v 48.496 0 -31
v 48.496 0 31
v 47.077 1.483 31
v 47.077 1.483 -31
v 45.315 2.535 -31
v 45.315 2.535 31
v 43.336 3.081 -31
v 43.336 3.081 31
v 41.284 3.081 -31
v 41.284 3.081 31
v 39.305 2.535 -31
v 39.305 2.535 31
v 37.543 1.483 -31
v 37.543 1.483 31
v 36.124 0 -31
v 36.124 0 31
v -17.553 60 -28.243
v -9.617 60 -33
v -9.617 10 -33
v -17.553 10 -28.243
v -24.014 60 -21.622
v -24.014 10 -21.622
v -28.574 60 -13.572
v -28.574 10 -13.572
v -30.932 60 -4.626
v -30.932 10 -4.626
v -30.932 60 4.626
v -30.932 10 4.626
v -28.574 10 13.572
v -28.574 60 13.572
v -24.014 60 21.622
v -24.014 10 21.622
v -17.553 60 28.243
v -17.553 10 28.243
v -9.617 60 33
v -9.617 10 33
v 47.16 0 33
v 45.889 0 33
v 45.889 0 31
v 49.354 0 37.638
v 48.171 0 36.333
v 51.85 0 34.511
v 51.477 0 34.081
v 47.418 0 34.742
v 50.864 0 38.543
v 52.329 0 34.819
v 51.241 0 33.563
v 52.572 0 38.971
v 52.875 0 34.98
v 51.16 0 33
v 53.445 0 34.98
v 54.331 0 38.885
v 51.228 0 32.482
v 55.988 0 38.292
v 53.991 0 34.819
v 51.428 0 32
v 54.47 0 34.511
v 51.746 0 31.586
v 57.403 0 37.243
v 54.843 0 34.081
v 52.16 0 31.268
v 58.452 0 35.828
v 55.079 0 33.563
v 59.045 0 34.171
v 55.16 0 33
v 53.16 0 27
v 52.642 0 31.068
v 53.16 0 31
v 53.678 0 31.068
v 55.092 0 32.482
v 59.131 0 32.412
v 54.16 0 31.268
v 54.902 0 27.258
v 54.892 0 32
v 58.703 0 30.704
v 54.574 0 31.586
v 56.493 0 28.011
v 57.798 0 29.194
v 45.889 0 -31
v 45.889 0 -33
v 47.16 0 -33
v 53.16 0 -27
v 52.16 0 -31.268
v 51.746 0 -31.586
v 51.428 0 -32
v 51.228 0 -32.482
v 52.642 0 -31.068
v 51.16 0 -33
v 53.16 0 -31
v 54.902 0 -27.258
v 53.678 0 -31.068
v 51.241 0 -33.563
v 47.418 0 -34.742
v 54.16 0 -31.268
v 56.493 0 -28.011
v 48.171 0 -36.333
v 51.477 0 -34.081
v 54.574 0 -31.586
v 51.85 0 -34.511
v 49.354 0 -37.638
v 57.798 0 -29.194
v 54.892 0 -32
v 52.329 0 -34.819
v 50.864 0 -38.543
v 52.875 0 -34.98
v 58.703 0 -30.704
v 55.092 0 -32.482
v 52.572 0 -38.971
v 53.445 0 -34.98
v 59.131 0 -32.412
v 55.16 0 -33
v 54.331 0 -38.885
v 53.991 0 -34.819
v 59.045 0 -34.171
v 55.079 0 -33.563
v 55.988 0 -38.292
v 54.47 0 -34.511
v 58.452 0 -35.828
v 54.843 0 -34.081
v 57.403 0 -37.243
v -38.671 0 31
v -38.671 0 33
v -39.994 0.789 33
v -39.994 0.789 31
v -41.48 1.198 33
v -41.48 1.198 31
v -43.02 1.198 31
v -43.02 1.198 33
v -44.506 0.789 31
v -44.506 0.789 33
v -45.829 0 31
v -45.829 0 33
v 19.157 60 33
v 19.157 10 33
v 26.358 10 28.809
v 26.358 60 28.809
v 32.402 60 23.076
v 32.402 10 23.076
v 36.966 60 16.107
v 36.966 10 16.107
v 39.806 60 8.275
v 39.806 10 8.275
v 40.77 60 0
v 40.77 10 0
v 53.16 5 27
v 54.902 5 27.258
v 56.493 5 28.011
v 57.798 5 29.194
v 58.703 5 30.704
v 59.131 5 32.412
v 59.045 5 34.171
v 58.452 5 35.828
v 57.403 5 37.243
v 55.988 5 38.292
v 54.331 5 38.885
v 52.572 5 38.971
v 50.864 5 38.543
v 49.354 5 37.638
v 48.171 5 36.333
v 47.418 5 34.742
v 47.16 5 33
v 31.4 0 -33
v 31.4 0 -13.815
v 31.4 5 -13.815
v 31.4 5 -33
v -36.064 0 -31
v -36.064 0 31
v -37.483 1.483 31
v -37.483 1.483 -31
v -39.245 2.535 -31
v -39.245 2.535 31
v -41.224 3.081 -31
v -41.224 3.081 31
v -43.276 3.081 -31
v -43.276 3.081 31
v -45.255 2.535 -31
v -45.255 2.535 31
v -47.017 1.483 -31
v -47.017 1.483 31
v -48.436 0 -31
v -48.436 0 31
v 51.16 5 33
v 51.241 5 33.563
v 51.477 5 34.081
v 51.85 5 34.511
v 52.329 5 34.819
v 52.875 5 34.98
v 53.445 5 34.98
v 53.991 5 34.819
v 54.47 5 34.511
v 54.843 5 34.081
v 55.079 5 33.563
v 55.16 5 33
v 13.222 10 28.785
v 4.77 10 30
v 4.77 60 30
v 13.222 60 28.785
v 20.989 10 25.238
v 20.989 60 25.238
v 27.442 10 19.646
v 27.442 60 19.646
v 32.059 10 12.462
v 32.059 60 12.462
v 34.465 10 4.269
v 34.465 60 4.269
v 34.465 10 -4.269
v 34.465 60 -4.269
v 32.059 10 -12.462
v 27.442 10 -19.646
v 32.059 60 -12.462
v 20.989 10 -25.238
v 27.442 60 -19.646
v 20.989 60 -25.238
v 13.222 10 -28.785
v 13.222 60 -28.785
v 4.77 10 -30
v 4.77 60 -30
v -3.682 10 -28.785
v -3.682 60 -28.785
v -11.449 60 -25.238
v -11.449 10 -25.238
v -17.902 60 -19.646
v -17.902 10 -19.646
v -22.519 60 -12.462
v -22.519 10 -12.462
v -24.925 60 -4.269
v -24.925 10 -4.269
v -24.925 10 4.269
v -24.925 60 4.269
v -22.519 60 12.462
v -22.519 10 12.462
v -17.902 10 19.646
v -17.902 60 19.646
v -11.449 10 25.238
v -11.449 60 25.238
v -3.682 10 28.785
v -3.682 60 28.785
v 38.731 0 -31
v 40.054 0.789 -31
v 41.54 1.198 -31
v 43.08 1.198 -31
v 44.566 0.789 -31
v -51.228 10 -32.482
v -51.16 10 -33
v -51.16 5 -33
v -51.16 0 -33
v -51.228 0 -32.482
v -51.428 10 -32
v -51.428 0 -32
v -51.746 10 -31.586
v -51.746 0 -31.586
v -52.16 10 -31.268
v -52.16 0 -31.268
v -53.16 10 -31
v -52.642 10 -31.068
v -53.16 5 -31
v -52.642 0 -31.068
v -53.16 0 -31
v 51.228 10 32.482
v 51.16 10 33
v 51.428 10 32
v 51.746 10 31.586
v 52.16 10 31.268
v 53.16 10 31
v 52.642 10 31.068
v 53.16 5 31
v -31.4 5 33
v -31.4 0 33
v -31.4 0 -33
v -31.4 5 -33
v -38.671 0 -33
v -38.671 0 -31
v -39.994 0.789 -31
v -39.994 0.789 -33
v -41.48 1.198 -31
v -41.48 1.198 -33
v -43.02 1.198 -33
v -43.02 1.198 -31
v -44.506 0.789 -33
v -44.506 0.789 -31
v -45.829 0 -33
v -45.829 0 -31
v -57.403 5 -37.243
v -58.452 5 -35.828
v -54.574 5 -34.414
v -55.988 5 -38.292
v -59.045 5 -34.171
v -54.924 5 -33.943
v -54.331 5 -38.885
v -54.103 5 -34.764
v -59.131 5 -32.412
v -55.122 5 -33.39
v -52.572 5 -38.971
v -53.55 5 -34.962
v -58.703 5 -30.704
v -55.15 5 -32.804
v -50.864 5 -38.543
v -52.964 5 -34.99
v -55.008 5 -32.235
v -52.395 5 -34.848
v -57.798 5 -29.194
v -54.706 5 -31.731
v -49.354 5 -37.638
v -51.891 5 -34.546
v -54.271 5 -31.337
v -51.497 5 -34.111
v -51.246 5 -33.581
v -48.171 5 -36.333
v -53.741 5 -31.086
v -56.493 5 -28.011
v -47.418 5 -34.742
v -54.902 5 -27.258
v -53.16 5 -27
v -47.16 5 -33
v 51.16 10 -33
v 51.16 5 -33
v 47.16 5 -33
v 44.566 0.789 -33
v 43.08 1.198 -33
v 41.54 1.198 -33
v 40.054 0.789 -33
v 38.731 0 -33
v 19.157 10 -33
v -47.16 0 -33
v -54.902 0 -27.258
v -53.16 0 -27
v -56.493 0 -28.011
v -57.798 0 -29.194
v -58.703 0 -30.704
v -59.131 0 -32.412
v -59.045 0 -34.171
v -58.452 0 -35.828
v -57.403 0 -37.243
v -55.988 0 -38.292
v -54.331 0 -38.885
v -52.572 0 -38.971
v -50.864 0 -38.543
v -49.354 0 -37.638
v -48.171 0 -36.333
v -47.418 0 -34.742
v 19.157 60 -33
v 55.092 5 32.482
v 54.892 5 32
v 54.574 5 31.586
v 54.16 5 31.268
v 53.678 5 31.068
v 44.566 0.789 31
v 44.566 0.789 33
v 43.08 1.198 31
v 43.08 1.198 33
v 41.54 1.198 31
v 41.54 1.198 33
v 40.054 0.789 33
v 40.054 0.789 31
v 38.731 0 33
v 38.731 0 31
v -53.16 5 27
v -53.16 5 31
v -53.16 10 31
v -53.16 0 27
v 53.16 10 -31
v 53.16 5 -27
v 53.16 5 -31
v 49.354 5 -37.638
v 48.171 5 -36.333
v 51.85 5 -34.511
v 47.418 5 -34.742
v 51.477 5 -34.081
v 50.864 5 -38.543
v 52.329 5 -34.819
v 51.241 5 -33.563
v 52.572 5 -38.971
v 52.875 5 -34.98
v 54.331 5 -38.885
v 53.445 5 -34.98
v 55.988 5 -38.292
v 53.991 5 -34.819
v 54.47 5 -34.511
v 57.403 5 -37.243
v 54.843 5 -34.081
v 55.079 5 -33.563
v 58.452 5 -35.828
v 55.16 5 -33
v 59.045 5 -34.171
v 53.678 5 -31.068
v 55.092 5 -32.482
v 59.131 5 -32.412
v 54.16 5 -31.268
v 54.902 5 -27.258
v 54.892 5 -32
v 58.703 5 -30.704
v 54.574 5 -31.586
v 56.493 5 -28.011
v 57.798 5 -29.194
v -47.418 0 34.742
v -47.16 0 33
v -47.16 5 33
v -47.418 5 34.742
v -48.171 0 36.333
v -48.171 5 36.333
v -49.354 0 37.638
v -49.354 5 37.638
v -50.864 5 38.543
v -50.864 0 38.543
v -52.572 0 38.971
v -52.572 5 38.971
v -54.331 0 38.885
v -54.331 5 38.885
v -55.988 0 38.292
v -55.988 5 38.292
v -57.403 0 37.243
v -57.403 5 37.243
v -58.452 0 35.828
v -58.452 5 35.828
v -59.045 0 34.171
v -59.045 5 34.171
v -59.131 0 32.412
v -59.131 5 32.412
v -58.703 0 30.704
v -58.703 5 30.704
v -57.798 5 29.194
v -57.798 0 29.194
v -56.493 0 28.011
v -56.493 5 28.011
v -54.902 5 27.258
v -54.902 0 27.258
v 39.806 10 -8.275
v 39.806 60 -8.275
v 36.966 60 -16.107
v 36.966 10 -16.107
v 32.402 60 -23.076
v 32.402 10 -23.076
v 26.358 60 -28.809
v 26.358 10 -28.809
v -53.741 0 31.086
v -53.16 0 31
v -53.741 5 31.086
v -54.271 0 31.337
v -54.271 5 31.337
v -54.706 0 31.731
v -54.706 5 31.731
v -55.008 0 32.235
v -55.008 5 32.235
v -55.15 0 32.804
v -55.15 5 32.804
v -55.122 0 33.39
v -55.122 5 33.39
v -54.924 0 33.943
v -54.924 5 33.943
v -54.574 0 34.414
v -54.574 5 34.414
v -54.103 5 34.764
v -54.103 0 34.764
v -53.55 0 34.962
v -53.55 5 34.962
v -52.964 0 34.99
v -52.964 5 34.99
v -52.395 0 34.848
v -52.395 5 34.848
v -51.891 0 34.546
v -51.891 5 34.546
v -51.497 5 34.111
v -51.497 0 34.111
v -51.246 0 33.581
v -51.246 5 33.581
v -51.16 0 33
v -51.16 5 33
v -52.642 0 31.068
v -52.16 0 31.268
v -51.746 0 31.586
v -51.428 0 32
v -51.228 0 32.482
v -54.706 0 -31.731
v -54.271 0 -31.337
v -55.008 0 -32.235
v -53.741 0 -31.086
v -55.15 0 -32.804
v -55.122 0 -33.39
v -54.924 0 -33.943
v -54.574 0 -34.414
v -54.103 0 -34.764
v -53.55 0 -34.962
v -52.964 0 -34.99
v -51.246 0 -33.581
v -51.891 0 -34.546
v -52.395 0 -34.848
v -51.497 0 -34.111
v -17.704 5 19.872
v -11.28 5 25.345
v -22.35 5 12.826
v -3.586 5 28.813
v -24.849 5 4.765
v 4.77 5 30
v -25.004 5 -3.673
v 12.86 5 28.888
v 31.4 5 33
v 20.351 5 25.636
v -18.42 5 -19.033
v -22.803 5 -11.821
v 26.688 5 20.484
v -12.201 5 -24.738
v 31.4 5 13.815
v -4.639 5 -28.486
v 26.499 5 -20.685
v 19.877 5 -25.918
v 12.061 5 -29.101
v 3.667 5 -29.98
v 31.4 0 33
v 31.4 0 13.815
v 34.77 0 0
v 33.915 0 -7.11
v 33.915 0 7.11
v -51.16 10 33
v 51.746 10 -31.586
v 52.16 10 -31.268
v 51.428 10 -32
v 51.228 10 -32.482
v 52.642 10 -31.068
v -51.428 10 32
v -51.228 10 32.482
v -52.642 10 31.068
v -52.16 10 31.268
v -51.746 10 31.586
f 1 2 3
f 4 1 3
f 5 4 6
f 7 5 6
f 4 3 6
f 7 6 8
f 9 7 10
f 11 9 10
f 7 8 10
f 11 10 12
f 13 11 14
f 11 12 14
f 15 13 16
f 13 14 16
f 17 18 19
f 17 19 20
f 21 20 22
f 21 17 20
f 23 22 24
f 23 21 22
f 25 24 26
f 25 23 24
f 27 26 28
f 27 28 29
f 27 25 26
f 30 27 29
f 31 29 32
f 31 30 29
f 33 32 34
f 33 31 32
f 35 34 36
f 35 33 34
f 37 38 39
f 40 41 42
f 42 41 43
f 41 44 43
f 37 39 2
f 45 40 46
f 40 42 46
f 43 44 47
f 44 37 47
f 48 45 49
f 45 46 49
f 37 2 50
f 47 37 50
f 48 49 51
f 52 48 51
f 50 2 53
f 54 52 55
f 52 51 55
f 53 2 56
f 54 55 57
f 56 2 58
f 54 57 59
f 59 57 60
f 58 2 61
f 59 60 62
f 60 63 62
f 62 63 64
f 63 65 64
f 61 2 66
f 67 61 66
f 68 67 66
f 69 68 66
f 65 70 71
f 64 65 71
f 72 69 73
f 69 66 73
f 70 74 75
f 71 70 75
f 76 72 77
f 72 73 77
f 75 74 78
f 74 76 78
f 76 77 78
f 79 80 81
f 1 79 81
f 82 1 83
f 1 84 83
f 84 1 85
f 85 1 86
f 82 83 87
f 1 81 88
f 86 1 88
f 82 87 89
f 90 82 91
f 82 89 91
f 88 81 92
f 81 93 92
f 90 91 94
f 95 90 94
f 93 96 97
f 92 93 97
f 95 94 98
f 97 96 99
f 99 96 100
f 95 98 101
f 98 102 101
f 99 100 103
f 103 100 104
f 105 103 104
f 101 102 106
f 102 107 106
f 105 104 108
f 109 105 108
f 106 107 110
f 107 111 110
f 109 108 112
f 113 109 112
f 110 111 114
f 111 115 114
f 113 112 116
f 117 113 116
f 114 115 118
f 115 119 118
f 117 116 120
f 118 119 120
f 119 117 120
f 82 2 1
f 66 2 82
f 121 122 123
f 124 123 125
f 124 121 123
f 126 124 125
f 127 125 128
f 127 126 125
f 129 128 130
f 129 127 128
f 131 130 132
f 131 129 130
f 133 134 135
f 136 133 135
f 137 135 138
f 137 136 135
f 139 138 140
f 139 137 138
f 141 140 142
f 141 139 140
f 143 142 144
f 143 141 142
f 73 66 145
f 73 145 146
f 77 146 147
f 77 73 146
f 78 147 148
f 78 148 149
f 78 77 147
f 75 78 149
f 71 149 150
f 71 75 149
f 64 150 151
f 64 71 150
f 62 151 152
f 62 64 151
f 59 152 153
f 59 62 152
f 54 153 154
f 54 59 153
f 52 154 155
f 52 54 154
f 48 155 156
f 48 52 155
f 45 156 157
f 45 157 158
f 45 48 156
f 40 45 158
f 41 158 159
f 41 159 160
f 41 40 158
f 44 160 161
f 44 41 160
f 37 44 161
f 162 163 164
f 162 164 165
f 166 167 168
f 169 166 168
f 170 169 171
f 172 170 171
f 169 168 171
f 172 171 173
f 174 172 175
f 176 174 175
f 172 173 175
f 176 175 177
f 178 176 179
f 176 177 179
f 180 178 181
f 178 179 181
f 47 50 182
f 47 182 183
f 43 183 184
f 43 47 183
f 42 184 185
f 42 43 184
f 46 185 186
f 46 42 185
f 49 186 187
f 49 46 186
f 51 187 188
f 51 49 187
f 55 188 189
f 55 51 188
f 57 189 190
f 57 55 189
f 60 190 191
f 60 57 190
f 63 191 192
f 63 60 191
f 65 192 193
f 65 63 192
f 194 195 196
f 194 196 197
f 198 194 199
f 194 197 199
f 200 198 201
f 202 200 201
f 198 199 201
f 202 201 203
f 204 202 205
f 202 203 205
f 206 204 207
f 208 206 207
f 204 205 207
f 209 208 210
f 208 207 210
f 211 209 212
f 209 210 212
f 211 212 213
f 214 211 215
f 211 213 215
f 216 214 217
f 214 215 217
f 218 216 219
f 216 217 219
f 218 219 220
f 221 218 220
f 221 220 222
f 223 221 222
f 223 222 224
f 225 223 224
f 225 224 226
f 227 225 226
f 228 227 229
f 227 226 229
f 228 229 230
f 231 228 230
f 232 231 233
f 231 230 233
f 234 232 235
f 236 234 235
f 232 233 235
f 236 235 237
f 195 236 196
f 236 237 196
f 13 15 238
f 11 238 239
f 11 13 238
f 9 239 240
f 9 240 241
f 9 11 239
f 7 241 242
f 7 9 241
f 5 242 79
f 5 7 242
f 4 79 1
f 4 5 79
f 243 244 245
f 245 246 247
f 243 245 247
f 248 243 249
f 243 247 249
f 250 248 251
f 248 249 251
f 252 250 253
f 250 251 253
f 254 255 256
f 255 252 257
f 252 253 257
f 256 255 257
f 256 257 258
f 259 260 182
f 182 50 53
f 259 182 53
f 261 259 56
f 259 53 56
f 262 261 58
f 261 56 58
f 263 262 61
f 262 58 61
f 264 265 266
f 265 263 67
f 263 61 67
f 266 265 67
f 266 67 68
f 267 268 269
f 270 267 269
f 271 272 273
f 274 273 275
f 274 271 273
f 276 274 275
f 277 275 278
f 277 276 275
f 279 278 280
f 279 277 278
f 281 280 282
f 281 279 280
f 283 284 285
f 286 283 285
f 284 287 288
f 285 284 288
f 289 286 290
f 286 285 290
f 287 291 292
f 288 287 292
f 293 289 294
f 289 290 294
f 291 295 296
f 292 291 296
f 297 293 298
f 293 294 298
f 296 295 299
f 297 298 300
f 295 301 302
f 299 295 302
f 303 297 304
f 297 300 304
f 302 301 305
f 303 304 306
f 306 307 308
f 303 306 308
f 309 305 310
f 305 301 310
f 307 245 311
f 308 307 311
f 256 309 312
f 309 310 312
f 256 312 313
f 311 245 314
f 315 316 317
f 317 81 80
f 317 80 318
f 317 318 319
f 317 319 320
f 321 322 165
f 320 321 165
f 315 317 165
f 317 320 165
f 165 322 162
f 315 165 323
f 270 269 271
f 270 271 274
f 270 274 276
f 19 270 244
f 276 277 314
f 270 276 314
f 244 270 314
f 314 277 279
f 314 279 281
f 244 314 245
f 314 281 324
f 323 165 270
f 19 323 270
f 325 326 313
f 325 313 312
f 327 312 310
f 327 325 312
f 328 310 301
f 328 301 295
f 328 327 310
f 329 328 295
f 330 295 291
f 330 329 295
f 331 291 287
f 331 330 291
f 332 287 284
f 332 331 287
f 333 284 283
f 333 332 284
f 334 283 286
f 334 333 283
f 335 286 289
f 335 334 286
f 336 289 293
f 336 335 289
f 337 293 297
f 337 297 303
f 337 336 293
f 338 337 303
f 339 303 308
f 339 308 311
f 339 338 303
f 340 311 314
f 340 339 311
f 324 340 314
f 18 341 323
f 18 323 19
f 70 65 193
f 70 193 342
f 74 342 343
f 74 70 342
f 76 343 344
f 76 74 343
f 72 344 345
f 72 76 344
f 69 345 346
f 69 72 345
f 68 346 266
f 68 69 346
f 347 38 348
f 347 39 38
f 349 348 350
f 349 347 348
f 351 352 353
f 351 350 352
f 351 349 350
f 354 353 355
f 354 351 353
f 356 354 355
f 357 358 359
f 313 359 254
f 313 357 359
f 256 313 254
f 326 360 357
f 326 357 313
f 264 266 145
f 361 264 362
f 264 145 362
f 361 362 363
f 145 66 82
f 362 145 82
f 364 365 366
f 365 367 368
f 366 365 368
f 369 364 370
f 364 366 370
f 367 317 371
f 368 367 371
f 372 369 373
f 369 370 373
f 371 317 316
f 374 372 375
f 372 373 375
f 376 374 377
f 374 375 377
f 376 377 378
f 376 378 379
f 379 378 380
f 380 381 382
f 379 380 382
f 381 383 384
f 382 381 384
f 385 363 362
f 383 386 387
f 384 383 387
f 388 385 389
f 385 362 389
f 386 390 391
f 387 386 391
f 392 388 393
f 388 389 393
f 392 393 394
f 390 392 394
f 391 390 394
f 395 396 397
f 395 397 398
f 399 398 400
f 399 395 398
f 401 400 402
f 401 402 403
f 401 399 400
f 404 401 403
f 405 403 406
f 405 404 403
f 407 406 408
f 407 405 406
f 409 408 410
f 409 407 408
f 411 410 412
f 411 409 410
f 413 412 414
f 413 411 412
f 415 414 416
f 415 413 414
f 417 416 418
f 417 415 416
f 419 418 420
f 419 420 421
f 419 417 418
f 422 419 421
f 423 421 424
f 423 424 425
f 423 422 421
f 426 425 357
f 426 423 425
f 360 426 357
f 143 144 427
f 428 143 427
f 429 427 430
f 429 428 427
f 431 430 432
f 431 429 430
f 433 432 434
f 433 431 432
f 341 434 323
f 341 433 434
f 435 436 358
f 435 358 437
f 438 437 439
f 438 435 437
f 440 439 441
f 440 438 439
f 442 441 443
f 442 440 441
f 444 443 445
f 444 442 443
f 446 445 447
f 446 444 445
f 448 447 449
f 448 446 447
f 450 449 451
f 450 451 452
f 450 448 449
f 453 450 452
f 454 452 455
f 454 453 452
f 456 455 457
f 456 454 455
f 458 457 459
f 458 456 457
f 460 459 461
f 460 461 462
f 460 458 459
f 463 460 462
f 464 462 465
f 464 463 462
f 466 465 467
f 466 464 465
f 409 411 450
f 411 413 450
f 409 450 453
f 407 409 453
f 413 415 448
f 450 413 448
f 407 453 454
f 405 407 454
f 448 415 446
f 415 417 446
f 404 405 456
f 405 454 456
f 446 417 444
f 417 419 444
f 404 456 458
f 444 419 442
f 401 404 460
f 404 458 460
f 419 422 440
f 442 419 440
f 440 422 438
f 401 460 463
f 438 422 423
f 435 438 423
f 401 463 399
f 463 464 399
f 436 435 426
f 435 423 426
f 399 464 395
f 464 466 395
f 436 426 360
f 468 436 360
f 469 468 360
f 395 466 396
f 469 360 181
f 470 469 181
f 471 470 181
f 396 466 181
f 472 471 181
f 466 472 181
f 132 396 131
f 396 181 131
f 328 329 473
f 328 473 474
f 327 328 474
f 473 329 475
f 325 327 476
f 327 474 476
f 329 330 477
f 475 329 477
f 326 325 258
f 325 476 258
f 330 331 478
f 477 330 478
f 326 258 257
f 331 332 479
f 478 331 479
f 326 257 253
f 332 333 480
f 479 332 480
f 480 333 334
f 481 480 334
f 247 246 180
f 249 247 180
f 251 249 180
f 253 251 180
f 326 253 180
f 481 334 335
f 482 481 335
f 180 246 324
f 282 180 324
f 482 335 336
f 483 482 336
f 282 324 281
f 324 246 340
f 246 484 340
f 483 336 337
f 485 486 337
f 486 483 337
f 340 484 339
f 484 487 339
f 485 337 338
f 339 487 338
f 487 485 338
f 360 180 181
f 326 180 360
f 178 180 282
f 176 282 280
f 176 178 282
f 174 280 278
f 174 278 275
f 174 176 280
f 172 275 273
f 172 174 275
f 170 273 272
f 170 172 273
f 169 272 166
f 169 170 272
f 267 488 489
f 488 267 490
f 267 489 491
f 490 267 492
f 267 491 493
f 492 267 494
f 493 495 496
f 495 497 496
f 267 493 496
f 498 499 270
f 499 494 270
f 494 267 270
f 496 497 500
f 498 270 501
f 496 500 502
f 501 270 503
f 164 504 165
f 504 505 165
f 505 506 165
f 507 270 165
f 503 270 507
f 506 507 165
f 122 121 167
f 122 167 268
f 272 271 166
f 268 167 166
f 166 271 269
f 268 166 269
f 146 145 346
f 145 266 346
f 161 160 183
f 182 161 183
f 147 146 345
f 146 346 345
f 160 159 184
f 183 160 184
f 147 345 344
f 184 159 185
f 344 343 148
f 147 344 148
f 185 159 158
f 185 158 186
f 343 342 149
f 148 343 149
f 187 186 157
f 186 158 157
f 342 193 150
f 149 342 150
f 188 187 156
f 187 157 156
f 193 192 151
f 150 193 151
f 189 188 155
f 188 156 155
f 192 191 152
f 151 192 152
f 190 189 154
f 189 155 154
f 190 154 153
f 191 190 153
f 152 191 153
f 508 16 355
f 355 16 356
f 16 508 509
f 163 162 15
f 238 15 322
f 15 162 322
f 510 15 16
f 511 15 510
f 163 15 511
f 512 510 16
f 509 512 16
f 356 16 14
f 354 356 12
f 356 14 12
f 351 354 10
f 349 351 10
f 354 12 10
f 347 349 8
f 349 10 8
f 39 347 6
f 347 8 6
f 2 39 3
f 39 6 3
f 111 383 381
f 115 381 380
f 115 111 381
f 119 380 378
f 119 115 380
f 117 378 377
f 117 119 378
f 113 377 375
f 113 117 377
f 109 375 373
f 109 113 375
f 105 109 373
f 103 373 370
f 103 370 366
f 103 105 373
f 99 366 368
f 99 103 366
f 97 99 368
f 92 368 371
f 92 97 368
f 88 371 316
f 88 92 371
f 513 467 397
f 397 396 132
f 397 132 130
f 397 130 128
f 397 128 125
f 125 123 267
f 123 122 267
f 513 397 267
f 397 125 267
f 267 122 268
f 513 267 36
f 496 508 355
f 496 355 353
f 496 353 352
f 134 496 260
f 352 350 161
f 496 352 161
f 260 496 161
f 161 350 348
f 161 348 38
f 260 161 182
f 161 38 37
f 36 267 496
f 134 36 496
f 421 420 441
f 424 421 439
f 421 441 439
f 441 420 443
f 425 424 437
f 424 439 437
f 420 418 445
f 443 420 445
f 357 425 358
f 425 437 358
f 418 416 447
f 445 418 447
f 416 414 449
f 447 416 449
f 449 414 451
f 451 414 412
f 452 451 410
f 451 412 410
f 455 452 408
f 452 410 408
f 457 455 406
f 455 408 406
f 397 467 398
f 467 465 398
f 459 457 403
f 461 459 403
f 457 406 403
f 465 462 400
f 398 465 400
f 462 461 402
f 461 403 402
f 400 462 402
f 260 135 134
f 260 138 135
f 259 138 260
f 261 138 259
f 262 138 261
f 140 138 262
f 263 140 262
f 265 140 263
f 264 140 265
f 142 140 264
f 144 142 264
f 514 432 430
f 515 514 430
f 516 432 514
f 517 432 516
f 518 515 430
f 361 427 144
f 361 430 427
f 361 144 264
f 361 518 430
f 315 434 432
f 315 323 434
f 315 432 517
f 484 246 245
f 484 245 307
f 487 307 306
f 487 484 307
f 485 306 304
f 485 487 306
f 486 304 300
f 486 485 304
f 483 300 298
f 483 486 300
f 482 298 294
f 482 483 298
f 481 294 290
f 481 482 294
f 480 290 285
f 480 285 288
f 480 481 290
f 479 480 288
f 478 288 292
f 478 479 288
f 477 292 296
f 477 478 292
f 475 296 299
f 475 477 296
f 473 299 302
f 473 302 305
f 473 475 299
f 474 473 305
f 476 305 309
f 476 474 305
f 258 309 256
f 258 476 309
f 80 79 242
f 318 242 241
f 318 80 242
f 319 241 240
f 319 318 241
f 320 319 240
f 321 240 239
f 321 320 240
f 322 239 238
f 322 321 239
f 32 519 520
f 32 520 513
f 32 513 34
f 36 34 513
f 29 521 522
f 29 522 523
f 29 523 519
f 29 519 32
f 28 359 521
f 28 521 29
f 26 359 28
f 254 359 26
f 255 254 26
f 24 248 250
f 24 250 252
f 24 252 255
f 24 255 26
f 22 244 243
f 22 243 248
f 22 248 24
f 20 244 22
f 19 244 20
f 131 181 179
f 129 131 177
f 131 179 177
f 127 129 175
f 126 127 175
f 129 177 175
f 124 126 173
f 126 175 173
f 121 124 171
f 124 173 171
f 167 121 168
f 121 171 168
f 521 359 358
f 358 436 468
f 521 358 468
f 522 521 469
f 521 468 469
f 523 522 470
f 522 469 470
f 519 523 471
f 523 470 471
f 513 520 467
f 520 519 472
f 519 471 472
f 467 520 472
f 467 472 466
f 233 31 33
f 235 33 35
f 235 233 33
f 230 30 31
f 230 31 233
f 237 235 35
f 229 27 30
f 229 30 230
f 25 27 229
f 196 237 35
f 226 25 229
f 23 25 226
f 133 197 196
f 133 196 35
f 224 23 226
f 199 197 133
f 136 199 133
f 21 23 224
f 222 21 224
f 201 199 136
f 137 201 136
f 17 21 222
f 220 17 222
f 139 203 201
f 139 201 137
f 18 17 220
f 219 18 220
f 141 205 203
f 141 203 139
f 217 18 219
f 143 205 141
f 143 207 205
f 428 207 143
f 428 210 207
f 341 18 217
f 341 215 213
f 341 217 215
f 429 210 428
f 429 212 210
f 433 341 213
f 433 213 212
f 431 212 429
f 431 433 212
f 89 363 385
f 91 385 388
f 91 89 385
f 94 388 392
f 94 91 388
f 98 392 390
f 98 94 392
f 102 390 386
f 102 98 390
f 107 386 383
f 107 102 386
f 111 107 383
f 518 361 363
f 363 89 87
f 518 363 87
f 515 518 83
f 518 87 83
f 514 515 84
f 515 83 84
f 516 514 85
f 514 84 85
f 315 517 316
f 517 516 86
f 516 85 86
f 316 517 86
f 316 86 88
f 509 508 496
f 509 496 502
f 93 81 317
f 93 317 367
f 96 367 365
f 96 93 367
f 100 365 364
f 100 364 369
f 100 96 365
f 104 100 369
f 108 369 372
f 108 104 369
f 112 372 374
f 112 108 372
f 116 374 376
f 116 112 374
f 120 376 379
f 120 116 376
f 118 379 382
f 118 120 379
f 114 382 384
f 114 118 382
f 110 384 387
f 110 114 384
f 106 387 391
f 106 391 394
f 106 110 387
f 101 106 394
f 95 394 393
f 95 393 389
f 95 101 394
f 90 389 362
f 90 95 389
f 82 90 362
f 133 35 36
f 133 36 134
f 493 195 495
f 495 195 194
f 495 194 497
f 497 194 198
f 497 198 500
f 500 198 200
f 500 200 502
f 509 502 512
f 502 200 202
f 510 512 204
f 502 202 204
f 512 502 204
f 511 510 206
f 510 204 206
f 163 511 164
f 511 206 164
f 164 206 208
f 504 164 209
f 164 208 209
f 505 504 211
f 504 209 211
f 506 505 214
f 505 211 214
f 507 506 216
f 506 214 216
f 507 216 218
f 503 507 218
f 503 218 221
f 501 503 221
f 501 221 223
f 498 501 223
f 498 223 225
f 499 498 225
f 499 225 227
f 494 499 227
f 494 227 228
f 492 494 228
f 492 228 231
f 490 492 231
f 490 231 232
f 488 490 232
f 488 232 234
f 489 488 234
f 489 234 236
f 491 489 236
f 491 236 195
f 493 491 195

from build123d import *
from build123d.topology import SkipClean

# Parameters (mm, degrees)
SKETCH1_W               = 21.76
SKETCH1_H               = 66
SKETCH1_W_2             = 62.8
BOSS_EXTRUDE1_DEPTH     = 10
SKETCH1_5_W             = 62.8
SKETCH1_5_H             = 66
CUT_EXTRUDE1_DEPTH      = 5
SKETCH3_R               = 7.65
SKETCH3_R_2             = 5.75
CUT_EXTRUDE2_DEPTH      = 62
CUT_EXTRUDE3_DEPTH      = 84.797288739
CUT_EXTRUDE3_DEPTH_BACK = 84.797288739
SKETCH3_3_R             = 5.75
BOSS_EXTRUDE2_DEPTH     = 5
CUT_EXTRUDE4_DEPTH      = 72.560503073
SKETCH5_R               = 30
CUT_EXTRUDE5_DEPTH      = 72.560503073
BOSS_EXTRUDE3_START     = 50
SKETCH5_3_R             = 30
BOSS_EXTRUDE3_DEPTH     = 50


with BuildPart() as part:
    # Sketch1 → Boss-Extrude1 (new body)
    with BuildSketch(Plane(origin=(0, 0, 0), x_dir=(1, 0, 0), z_dir=(0, 1, 0))):
        with Locations((-42.28, 0)):
            Rectangle(SKETCH1_W, SKETCH1_H)
        Rectangle(SKETCH1_W_2, SKETCH1_H)
        with Locations((42.28, 0)):
            Rectangle(SKETCH1_W, SKETCH1_H)
    extrude(amount=BOSS_EXTRUDE1_DEPTH)

    # Sketch1<5> → Cut-Extrude1 (cut)
    with BuildSketch(Plane(origin=(0, 0, 0), x_dir=(1, 0, 0), z_dir=(0, 1, 0))):
        Rectangle(SKETCH1_5_W, SKETCH1_5_H)
    extrude(amount=CUT_EXTRUDE1_DEPTH, mode=Mode.SUBTRACT)

    # Sketch3 → Cut-Extrude2 (cut)
    # profile 1 of 4: a face of its own
    with BuildSketch(Plane.XY.offset(31)):
        with Locations((-42.25, -4.5)):
            Circle(SKETCH3_R)
        with Locations((-42.25, -4.5)):
            Circle(SKETCH3_R_2, mode=Mode.SUBTRACT)
    # profile 2 of 4: a face of its own
    with BuildSketch(Plane.XY.offset(31)):
        with Locations((-42.25, -4.5)):
            Circle(SKETCH3_R_2)
    # profile 3 of 4: a face of its own
    with BuildSketch(Plane.XY.offset(31)):
        with Locations((42.31, -4.5)):
            Circle(SKETCH3_R)
        with Locations((42.31, -4.5)):
            Circle(SKETCH3_R_2, mode=Mode.SUBTRACT)
    # profile 4 of 4: a face of its own
    with BuildSketch(Plane.XY.offset(31)):
        with Locations((42.31, -4.5)):
            Circle(SKETCH3_R_2)
    extrude(amount=-CUT_EXTRUDE2_DEPTH, mode=Mode.SUBTRACT)

    # Sketch3<3> → Cut-Extrude3 (cut, two sides: drawn at the far end of the back side and taken through both)
    with BuildSketch(Plane.XY.offset(31).offset(-CUT_EXTRUDE3_DEPTH_BACK)):
        with Locations((42.31, -4.5)):
            Circle(SKETCH3_3_R)
        with Locations((-42.25, -4.5)):
            Circle(SKETCH3_3_R)
    extrude(amount=CUT_EXTRUDE3_DEPTH + CUT_EXTRUDE3_DEPTH_BACK, mode=Mode.SUBTRACT)

    # Sketch4 → Boss-Extrude2 (add)
    with BuildSketch(Plane.XZ):
        with BuildLine():
            Line((-51.16, 33), (-47.16, 33))
            ThreePointArc((-47.16, 33), (-57.402640687, 37.242640687), (-53.16, 27))
            Line((-53.16, 27), (-53.16, 31))
            ThreePointArc((-53.16, 31), (-54.574213562, 34.414213562), (-51.16, 33))
        make_face()
        with BuildLine():
            ThreePointArc((-53.16, -27), (-57.402640687, -37.242640687), (-47.16, -33))
            Line((-47.16, -33), (-51.16, -33))
            ThreePointArc((-51.16, -33), (-54.574213562, -34.414213562), (-53.16, -31))
            Line((-53.16, -31), (-53.16, -27))
        make_face()
        with BuildLine():
            ThreePointArc((47.16, -33), (57.402640687, -37.242640687), (53.16, -27))
            Line((53.16, -27), (53.16, -31))
            ThreePointArc((53.16, -31), (54.574213562, -34.414213562), (51.16, -33))
            Line((51.16, -33), (47.16, -33))
        make_face()
        with BuildLine():
            ThreePointArc((53.16, 27), (57.402640687, 37.242640687), (47.16, 33))
            Line((47.16, 33), (51.16, 33))
            ThreePointArc((51.16, 33), (54.574213562, 34.414213562), (53.16, 31))
            Line((53.16, 31), (53.16, 27))
        make_face()
    extrude(amount=-BOSS_EXTRUDE2_DEPTH)

    # Sketch4<3> → Cut-Extrude4 (cut, through all)
    with SkipClean():  # the faces are left unmerged after this step: merging them gives an invalid solid
        with BuildSketch(Plane.XZ):
            with BuildLine():
                ThreePointArc((51.16, 33), (51.745786438, 31.585786438), (53.16, 31))
                Line((53.16, 31), (53.16, 33))
                Line((53.16, 33), (51.16, 33))
            make_face()
            with BuildLine():
                Line((53.16, 33), (53.16, 31))
                ThreePointArc((53.16, 31), (54.574213562, 31.585786438), (55.16, 33))
                ThreePointArc((55.16, 33), (53.16, 35), (51.16, 33))
                Line((51.16, 33), (53.16, 33))
            make_face()
            with BuildLine():
                ThreePointArc((55.16, -33), (54.574213562, -31.585786438), (53.16, -31))
                Line((53.16, -31), (53.16, -33))
                Line((53.16, -33), (51.16, -33))
                ThreePointArc((51.16, -33), (53.16, -35), (55.16, -33))
            make_face()
            with BuildLine():
                Line((53.16, -33), (53.16, -31))
                ThreePointArc((53.16, -31), (51.745786438, -31.585786438), (51.16, -33))
                Line((51.16, -33), (53.16, -33))
            make_face()
            with BuildLine():
                ThreePointArc((-53.16, -31), (-54.574213562, -34.414213562), (-51.16, -33))
                Line((-51.16, -33), (-53.16, -33))
                Line((-53.16, -33), (-53.16, -31))
            make_face()
            with BuildLine():
                Line((-53.16, -33), (-51.16, -33))
                ThreePointArc((-51.16, -33), (-51.745786438, -31.585786438), (-53.16, -31))
                Line((-53.16, -31), (-53.16, -33))
            make_face()
            with BuildLine():
                ThreePointArc((-53.16, 31), (-51.745786438, 31.585786438), (-51.16, 33))
                Line((-51.16, 33), (-53.16, 33))
                Line((-53.16, 33), (-53.16, 31))
            make_face()
            with BuildLine():
                Line((-53.16, 33), (-51.16, 33))
                ThreePointArc((-51.16, 33), (-54.574213562, 34.414213562), (-53.16, 31))
                Line((-53.16, 31), (-53.16, 33))
            make_face()
        extrude(amount=-CUT_EXTRUDE4_DEPTH, mode=Mode.SUBTRACT)

    # Sketch5 → Cut-Extrude5 (cut, through all)
    with SkipClean():  # the faces are left unmerged after this step: merging them gives an invalid solid
        with BuildSketch(Plane(origin=(0, 10, 0), x_dir=(1, 0, 0), z_dir=(0, 1, 0))):
            with Locations(Location((4.77, 0, 0), (0, 0, 270))):
                Circle(SKETCH5_R)
        extrude(amount=-CUT_EXTRUDE5_DEPTH, mode=Mode.SUBTRACT)

    # Sketch5<3> → Boss-Extrude3 (add)
    with SkipClean():  # the faces are left unmerged after this step: merging them gives an invalid solid
        with BuildSketch(Plane(origin=(0, 10, 0), x_dir=(1, 0, 0), z_dir=(0, 1, 0)).offset(BOSS_EXTRUDE3_START)):
            with BuildLine():
                Line((-9.61749457, -33), (19.15749457, -33))
                ThreePointArc((19.15749457, -33), (34.886024011, -19.723719166), (40.77, 0))
                ThreePointArc((40.77, 0), (34.886024011, 19.723719166), (19.15749457, 33))
                Line((19.15749457, 33), (-9.61749457, 33))
                ThreePointArc((-9.61749457, 33), (-31.23, 0), (-9.61749457, -33))
            make_face()
            with Locations(Location((4.77, 0, 0), (0, 0, 270))):
                Circle(SKETCH5_3_R, mode=Mode.SUBTRACT)
        extrude(amount=-BOSS_EXTRUDE3_DEPTH)


solid = part.part
